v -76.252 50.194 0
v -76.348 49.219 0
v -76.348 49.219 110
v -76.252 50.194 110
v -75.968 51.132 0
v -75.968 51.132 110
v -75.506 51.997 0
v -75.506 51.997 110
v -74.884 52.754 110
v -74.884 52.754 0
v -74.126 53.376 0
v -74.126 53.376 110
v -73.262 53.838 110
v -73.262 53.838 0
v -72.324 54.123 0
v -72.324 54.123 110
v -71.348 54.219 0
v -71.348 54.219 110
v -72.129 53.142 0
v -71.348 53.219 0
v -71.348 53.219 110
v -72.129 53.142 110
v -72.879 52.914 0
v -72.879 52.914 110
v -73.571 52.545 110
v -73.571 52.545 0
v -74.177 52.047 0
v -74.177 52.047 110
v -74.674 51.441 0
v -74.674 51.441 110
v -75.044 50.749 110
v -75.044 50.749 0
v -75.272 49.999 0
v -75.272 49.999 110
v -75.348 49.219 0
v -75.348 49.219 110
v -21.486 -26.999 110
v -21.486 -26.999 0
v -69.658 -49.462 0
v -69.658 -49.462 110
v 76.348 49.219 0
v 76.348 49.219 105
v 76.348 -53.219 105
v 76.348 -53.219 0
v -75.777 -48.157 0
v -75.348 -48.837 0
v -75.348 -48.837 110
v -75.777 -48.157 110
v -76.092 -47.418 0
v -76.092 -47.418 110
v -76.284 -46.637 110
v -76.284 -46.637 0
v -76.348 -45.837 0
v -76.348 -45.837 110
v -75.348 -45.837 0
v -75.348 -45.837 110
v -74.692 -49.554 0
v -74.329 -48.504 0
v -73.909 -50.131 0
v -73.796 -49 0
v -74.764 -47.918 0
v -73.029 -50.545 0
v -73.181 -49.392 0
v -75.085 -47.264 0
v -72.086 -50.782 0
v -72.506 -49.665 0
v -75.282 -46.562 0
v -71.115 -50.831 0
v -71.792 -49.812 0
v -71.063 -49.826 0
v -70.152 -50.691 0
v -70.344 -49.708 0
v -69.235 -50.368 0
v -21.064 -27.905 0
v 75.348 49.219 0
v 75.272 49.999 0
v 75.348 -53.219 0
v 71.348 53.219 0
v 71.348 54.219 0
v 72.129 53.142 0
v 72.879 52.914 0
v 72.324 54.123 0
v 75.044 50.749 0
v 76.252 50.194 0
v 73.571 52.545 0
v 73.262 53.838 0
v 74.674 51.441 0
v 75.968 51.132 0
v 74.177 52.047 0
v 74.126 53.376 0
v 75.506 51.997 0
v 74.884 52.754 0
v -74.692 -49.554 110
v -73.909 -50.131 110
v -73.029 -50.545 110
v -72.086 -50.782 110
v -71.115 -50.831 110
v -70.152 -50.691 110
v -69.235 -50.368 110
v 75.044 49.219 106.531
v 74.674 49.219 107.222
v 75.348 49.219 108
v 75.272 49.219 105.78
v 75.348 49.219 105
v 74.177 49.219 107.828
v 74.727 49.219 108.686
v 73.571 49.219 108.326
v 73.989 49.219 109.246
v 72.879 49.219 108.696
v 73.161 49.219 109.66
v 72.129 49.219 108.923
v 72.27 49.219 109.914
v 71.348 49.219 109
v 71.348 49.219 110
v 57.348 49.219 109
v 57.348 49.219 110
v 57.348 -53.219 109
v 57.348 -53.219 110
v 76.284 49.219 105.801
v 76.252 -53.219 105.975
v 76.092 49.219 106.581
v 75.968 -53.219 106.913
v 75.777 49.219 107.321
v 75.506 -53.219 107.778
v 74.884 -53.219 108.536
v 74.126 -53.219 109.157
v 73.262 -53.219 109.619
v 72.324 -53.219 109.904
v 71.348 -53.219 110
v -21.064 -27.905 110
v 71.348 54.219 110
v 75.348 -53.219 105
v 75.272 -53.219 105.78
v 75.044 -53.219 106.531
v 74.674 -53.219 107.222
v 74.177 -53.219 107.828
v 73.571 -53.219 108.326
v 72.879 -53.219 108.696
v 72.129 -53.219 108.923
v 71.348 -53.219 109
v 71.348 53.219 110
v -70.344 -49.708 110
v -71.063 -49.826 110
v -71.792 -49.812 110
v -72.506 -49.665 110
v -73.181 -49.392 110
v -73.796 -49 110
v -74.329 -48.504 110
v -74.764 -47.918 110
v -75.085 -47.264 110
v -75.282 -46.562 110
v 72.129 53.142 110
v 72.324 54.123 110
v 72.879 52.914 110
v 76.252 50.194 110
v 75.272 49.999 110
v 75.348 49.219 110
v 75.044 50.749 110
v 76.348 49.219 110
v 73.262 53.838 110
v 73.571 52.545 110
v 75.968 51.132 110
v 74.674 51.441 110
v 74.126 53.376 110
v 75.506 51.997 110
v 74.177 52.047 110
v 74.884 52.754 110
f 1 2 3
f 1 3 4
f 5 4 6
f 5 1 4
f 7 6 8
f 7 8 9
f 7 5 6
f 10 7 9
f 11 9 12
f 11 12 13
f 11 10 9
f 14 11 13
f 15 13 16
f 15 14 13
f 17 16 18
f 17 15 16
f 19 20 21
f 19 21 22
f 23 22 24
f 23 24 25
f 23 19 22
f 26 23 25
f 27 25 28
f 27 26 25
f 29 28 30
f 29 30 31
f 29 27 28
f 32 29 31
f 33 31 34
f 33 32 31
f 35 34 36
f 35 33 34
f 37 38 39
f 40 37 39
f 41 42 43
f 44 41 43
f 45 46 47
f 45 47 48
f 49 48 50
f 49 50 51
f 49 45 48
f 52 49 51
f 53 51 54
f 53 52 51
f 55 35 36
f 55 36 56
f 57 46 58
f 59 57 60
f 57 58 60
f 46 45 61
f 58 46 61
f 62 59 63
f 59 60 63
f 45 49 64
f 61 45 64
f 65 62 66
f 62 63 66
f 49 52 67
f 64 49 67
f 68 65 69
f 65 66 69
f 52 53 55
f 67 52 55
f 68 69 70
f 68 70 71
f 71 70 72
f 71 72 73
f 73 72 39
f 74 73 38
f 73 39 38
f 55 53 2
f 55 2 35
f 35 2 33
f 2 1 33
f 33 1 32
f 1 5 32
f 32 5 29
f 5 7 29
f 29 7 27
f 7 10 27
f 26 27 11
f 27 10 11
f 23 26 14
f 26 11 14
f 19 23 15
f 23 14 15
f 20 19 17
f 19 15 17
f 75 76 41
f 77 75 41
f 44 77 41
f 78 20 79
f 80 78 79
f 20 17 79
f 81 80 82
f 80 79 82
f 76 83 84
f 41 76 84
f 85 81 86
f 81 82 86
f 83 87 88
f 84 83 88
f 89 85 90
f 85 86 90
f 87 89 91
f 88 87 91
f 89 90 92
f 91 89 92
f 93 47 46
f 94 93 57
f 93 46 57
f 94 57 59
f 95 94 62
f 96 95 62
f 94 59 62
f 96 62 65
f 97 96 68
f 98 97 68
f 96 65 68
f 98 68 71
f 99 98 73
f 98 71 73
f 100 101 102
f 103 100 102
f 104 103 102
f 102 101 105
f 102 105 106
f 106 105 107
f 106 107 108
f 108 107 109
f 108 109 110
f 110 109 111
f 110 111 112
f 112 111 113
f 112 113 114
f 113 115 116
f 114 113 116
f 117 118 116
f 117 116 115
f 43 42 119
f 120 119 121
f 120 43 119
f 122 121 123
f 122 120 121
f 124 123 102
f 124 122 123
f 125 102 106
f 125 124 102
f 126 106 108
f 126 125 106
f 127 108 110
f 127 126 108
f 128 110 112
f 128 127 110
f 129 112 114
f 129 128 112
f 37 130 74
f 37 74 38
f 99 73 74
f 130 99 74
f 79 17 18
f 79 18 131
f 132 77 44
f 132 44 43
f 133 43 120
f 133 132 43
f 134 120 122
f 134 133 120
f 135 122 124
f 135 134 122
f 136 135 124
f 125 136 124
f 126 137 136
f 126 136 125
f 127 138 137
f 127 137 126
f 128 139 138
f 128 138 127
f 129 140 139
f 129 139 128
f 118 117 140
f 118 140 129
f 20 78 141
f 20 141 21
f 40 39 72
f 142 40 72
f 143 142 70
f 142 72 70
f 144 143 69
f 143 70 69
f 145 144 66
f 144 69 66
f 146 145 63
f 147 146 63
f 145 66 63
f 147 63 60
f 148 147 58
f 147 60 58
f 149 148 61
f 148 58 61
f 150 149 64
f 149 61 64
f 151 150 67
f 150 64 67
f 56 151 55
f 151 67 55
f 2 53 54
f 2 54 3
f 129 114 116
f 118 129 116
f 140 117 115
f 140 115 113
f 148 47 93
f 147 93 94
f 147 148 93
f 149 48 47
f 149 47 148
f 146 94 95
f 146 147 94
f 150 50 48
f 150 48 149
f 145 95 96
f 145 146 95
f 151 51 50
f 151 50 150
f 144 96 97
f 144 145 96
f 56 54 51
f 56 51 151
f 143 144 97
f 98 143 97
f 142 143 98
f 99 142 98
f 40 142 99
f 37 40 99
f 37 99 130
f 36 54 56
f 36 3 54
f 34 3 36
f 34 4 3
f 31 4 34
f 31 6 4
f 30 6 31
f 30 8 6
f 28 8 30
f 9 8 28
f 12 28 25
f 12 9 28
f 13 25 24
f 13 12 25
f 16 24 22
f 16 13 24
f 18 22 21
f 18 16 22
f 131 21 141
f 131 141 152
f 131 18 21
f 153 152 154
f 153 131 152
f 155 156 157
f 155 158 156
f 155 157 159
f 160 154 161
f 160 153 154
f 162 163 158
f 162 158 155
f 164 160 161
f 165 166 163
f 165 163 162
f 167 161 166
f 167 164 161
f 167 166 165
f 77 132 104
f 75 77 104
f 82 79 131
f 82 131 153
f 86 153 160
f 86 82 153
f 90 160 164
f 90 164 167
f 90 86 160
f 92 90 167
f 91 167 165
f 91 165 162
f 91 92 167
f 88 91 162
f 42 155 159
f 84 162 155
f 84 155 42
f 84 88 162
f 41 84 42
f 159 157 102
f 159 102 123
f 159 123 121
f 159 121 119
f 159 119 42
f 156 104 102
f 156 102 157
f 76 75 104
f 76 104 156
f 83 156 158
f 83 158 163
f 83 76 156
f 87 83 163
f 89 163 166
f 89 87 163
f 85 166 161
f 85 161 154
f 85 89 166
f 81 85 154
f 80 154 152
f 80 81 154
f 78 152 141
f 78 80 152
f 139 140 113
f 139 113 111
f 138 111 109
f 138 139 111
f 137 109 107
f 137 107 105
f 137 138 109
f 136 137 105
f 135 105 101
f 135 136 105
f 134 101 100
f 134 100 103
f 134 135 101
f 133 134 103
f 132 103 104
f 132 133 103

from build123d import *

# Parameters (mm, degrees)
BASE_FLANGE1_DEPTH           = 110
EDGE_FLANGE1_DEPTH           = 110
EDGE_FLANGE1_2_DEPTH         = 110
EDGE_FLANGE2_STRIP_W         = 12
EDGE_FLANGE2_STRIP_H         = 1
EDGE_FLANGE2_STRIP_CUT_DEPTH = 102.437324841
EDGE_FLANGE2_DEPTH           = 102.437324841


# Read off the part's stored shape, not the designer's step: Edge-Flange1
# Sheet-metal steps are written as plain solids
with BuildPart() as part:
    # Sketch1 → Base-Flange1 (new body)
    with BuildSketch(Plane.XY):
        with BuildLine():
            Line((75.34839628, -53.21866242), (75.34839628, 49.21866242))
            ThreePointArc((75.34839628, 49.21866242), (74.176823405, 52.047089545), (71.34839628, 53.21866242))
            Line((71.34839628, 53.21866242), (-71.34839628, 53.21866242))
            ThreePointArc((-71.34839628, 53.21866242), (-74.176823405, 52.047089545), (-75.34839628, 49.21866242))
            Line((-75.34839628, 49.21866242), (-75.34839628, -53.21866242))
            Line((-75.34839628, -53.21866242), (-76.34839628, -53.21866242))
            Line((-76.34839628, -53.21866242), (-76.34839628, 49.21866242))
            ThreePointArc((-76.34839628, 49.21866242), (-74.883930186, 52.754196326), (-71.34839628, 54.21866242))
            Line((-71.34839628, 54.21866242), (71.34839628, 54.21866242))
            ThreePointArc((71.34839628, 54.21866242), (74.883930186, 52.754196326), (76.34839628, 49.21866242))
            Line((76.34839628, 49.21866242), (76.34839628, -53.21866242))
            Line((76.34839628, -53.21866242), (75.34839628, -53.21866242))
        make_face()
    extrude(amount=BASE_FLANGE1_DEPTH)

    # Edge-Flange1 outline → Edge-Flange1 (cut)
    with BuildSketch(Plane.XY):
        with BuildLine():
            Line((-75.34839628, -53.21866242), (-75.34839628, -48.836542193))
            ThreePointArc((-75.34839628, -48.836542193), (-76.09181277, -47.417681023), (-76.34839628, -45.836542193))
            Line((-76.34839628, -45.836542193), (-76.34839628, -53.21866242))
            Line((-76.34839628, -53.21866242), (-75.34839628, -53.21866242))
        make_face()
    extrude(amount=EDGE_FLANGE1_DEPTH, mode=Mode.SUBTRACT)

    # Edge-Flange1 2 outline → Edge-Flange1 2 (add)
    with BuildSketch(Plane.XY):
        with BuildLine():
            ThreePointArc((-75.34839628, -48.836542193), (-72.563513138, -50.686644359), (-69.235304971, -50.368081128))
            Line((-69.235304971, -50.368081128), (-21.063621271, -27.905256112))
            Line((-21.063621271, -27.905256112), (-21.486239533, -26.998948325))
            Line((-21.486239533, -26.998948325), (-69.657923233, -49.461773341))
            ThreePointArc((-69.657923233, -49.461773341), (-73.497594713, -49.210107976), (-75.34839628, -45.836542193))
            Line((-75.34839628, -45.836542193), (-75.34839628, -48.836542193))
        make_face()
    extrude(amount=EDGE_FLANGE1_2_DEPTH)

    # Edge-Flange2 strip (across the edge) → Edge-Flange2 strip cut (cut)
    with BuildSketch(Plane(origin=(75.34839628, -53.21866242, 110), x_dir=(0, 0, -1), z_dir=(0, 1, 0))):
        with Locations((-1, -0.5)):
            Rectangle(EDGE_FLANGE2_STRIP_W, EDGE_FLANGE2_STRIP_H)
    extrude(amount=EDGE_FLANGE2_STRIP_CUT_DEPTH, mode=Mode.SUBTRACT)

    # Edge-Flange2 section (across the edge) → Edge-Flange2 (add)
    with BuildSketch(Plane(origin=(75.34839628, -53.21866242, 110), x_dir=(0, 0, -1), z_dir=(0, 1, 0))):
        with BuildLine():
            Line((0, 4), (0, 18))
            Line((0, 18), (1, 18))
            Line((1, 18), (1, 4))
            ThreePointArc((1, 4), (2.171572875, 1.171572875), (5, 0))
            Line((5, 0), (5, -1))
            ThreePointArc((5, -1), (1.464466094, 0.464466094), (0, 4))
        make_face()
    extrude(amount=EDGE_FLANGE2_DEPTH)


solid = part.part
